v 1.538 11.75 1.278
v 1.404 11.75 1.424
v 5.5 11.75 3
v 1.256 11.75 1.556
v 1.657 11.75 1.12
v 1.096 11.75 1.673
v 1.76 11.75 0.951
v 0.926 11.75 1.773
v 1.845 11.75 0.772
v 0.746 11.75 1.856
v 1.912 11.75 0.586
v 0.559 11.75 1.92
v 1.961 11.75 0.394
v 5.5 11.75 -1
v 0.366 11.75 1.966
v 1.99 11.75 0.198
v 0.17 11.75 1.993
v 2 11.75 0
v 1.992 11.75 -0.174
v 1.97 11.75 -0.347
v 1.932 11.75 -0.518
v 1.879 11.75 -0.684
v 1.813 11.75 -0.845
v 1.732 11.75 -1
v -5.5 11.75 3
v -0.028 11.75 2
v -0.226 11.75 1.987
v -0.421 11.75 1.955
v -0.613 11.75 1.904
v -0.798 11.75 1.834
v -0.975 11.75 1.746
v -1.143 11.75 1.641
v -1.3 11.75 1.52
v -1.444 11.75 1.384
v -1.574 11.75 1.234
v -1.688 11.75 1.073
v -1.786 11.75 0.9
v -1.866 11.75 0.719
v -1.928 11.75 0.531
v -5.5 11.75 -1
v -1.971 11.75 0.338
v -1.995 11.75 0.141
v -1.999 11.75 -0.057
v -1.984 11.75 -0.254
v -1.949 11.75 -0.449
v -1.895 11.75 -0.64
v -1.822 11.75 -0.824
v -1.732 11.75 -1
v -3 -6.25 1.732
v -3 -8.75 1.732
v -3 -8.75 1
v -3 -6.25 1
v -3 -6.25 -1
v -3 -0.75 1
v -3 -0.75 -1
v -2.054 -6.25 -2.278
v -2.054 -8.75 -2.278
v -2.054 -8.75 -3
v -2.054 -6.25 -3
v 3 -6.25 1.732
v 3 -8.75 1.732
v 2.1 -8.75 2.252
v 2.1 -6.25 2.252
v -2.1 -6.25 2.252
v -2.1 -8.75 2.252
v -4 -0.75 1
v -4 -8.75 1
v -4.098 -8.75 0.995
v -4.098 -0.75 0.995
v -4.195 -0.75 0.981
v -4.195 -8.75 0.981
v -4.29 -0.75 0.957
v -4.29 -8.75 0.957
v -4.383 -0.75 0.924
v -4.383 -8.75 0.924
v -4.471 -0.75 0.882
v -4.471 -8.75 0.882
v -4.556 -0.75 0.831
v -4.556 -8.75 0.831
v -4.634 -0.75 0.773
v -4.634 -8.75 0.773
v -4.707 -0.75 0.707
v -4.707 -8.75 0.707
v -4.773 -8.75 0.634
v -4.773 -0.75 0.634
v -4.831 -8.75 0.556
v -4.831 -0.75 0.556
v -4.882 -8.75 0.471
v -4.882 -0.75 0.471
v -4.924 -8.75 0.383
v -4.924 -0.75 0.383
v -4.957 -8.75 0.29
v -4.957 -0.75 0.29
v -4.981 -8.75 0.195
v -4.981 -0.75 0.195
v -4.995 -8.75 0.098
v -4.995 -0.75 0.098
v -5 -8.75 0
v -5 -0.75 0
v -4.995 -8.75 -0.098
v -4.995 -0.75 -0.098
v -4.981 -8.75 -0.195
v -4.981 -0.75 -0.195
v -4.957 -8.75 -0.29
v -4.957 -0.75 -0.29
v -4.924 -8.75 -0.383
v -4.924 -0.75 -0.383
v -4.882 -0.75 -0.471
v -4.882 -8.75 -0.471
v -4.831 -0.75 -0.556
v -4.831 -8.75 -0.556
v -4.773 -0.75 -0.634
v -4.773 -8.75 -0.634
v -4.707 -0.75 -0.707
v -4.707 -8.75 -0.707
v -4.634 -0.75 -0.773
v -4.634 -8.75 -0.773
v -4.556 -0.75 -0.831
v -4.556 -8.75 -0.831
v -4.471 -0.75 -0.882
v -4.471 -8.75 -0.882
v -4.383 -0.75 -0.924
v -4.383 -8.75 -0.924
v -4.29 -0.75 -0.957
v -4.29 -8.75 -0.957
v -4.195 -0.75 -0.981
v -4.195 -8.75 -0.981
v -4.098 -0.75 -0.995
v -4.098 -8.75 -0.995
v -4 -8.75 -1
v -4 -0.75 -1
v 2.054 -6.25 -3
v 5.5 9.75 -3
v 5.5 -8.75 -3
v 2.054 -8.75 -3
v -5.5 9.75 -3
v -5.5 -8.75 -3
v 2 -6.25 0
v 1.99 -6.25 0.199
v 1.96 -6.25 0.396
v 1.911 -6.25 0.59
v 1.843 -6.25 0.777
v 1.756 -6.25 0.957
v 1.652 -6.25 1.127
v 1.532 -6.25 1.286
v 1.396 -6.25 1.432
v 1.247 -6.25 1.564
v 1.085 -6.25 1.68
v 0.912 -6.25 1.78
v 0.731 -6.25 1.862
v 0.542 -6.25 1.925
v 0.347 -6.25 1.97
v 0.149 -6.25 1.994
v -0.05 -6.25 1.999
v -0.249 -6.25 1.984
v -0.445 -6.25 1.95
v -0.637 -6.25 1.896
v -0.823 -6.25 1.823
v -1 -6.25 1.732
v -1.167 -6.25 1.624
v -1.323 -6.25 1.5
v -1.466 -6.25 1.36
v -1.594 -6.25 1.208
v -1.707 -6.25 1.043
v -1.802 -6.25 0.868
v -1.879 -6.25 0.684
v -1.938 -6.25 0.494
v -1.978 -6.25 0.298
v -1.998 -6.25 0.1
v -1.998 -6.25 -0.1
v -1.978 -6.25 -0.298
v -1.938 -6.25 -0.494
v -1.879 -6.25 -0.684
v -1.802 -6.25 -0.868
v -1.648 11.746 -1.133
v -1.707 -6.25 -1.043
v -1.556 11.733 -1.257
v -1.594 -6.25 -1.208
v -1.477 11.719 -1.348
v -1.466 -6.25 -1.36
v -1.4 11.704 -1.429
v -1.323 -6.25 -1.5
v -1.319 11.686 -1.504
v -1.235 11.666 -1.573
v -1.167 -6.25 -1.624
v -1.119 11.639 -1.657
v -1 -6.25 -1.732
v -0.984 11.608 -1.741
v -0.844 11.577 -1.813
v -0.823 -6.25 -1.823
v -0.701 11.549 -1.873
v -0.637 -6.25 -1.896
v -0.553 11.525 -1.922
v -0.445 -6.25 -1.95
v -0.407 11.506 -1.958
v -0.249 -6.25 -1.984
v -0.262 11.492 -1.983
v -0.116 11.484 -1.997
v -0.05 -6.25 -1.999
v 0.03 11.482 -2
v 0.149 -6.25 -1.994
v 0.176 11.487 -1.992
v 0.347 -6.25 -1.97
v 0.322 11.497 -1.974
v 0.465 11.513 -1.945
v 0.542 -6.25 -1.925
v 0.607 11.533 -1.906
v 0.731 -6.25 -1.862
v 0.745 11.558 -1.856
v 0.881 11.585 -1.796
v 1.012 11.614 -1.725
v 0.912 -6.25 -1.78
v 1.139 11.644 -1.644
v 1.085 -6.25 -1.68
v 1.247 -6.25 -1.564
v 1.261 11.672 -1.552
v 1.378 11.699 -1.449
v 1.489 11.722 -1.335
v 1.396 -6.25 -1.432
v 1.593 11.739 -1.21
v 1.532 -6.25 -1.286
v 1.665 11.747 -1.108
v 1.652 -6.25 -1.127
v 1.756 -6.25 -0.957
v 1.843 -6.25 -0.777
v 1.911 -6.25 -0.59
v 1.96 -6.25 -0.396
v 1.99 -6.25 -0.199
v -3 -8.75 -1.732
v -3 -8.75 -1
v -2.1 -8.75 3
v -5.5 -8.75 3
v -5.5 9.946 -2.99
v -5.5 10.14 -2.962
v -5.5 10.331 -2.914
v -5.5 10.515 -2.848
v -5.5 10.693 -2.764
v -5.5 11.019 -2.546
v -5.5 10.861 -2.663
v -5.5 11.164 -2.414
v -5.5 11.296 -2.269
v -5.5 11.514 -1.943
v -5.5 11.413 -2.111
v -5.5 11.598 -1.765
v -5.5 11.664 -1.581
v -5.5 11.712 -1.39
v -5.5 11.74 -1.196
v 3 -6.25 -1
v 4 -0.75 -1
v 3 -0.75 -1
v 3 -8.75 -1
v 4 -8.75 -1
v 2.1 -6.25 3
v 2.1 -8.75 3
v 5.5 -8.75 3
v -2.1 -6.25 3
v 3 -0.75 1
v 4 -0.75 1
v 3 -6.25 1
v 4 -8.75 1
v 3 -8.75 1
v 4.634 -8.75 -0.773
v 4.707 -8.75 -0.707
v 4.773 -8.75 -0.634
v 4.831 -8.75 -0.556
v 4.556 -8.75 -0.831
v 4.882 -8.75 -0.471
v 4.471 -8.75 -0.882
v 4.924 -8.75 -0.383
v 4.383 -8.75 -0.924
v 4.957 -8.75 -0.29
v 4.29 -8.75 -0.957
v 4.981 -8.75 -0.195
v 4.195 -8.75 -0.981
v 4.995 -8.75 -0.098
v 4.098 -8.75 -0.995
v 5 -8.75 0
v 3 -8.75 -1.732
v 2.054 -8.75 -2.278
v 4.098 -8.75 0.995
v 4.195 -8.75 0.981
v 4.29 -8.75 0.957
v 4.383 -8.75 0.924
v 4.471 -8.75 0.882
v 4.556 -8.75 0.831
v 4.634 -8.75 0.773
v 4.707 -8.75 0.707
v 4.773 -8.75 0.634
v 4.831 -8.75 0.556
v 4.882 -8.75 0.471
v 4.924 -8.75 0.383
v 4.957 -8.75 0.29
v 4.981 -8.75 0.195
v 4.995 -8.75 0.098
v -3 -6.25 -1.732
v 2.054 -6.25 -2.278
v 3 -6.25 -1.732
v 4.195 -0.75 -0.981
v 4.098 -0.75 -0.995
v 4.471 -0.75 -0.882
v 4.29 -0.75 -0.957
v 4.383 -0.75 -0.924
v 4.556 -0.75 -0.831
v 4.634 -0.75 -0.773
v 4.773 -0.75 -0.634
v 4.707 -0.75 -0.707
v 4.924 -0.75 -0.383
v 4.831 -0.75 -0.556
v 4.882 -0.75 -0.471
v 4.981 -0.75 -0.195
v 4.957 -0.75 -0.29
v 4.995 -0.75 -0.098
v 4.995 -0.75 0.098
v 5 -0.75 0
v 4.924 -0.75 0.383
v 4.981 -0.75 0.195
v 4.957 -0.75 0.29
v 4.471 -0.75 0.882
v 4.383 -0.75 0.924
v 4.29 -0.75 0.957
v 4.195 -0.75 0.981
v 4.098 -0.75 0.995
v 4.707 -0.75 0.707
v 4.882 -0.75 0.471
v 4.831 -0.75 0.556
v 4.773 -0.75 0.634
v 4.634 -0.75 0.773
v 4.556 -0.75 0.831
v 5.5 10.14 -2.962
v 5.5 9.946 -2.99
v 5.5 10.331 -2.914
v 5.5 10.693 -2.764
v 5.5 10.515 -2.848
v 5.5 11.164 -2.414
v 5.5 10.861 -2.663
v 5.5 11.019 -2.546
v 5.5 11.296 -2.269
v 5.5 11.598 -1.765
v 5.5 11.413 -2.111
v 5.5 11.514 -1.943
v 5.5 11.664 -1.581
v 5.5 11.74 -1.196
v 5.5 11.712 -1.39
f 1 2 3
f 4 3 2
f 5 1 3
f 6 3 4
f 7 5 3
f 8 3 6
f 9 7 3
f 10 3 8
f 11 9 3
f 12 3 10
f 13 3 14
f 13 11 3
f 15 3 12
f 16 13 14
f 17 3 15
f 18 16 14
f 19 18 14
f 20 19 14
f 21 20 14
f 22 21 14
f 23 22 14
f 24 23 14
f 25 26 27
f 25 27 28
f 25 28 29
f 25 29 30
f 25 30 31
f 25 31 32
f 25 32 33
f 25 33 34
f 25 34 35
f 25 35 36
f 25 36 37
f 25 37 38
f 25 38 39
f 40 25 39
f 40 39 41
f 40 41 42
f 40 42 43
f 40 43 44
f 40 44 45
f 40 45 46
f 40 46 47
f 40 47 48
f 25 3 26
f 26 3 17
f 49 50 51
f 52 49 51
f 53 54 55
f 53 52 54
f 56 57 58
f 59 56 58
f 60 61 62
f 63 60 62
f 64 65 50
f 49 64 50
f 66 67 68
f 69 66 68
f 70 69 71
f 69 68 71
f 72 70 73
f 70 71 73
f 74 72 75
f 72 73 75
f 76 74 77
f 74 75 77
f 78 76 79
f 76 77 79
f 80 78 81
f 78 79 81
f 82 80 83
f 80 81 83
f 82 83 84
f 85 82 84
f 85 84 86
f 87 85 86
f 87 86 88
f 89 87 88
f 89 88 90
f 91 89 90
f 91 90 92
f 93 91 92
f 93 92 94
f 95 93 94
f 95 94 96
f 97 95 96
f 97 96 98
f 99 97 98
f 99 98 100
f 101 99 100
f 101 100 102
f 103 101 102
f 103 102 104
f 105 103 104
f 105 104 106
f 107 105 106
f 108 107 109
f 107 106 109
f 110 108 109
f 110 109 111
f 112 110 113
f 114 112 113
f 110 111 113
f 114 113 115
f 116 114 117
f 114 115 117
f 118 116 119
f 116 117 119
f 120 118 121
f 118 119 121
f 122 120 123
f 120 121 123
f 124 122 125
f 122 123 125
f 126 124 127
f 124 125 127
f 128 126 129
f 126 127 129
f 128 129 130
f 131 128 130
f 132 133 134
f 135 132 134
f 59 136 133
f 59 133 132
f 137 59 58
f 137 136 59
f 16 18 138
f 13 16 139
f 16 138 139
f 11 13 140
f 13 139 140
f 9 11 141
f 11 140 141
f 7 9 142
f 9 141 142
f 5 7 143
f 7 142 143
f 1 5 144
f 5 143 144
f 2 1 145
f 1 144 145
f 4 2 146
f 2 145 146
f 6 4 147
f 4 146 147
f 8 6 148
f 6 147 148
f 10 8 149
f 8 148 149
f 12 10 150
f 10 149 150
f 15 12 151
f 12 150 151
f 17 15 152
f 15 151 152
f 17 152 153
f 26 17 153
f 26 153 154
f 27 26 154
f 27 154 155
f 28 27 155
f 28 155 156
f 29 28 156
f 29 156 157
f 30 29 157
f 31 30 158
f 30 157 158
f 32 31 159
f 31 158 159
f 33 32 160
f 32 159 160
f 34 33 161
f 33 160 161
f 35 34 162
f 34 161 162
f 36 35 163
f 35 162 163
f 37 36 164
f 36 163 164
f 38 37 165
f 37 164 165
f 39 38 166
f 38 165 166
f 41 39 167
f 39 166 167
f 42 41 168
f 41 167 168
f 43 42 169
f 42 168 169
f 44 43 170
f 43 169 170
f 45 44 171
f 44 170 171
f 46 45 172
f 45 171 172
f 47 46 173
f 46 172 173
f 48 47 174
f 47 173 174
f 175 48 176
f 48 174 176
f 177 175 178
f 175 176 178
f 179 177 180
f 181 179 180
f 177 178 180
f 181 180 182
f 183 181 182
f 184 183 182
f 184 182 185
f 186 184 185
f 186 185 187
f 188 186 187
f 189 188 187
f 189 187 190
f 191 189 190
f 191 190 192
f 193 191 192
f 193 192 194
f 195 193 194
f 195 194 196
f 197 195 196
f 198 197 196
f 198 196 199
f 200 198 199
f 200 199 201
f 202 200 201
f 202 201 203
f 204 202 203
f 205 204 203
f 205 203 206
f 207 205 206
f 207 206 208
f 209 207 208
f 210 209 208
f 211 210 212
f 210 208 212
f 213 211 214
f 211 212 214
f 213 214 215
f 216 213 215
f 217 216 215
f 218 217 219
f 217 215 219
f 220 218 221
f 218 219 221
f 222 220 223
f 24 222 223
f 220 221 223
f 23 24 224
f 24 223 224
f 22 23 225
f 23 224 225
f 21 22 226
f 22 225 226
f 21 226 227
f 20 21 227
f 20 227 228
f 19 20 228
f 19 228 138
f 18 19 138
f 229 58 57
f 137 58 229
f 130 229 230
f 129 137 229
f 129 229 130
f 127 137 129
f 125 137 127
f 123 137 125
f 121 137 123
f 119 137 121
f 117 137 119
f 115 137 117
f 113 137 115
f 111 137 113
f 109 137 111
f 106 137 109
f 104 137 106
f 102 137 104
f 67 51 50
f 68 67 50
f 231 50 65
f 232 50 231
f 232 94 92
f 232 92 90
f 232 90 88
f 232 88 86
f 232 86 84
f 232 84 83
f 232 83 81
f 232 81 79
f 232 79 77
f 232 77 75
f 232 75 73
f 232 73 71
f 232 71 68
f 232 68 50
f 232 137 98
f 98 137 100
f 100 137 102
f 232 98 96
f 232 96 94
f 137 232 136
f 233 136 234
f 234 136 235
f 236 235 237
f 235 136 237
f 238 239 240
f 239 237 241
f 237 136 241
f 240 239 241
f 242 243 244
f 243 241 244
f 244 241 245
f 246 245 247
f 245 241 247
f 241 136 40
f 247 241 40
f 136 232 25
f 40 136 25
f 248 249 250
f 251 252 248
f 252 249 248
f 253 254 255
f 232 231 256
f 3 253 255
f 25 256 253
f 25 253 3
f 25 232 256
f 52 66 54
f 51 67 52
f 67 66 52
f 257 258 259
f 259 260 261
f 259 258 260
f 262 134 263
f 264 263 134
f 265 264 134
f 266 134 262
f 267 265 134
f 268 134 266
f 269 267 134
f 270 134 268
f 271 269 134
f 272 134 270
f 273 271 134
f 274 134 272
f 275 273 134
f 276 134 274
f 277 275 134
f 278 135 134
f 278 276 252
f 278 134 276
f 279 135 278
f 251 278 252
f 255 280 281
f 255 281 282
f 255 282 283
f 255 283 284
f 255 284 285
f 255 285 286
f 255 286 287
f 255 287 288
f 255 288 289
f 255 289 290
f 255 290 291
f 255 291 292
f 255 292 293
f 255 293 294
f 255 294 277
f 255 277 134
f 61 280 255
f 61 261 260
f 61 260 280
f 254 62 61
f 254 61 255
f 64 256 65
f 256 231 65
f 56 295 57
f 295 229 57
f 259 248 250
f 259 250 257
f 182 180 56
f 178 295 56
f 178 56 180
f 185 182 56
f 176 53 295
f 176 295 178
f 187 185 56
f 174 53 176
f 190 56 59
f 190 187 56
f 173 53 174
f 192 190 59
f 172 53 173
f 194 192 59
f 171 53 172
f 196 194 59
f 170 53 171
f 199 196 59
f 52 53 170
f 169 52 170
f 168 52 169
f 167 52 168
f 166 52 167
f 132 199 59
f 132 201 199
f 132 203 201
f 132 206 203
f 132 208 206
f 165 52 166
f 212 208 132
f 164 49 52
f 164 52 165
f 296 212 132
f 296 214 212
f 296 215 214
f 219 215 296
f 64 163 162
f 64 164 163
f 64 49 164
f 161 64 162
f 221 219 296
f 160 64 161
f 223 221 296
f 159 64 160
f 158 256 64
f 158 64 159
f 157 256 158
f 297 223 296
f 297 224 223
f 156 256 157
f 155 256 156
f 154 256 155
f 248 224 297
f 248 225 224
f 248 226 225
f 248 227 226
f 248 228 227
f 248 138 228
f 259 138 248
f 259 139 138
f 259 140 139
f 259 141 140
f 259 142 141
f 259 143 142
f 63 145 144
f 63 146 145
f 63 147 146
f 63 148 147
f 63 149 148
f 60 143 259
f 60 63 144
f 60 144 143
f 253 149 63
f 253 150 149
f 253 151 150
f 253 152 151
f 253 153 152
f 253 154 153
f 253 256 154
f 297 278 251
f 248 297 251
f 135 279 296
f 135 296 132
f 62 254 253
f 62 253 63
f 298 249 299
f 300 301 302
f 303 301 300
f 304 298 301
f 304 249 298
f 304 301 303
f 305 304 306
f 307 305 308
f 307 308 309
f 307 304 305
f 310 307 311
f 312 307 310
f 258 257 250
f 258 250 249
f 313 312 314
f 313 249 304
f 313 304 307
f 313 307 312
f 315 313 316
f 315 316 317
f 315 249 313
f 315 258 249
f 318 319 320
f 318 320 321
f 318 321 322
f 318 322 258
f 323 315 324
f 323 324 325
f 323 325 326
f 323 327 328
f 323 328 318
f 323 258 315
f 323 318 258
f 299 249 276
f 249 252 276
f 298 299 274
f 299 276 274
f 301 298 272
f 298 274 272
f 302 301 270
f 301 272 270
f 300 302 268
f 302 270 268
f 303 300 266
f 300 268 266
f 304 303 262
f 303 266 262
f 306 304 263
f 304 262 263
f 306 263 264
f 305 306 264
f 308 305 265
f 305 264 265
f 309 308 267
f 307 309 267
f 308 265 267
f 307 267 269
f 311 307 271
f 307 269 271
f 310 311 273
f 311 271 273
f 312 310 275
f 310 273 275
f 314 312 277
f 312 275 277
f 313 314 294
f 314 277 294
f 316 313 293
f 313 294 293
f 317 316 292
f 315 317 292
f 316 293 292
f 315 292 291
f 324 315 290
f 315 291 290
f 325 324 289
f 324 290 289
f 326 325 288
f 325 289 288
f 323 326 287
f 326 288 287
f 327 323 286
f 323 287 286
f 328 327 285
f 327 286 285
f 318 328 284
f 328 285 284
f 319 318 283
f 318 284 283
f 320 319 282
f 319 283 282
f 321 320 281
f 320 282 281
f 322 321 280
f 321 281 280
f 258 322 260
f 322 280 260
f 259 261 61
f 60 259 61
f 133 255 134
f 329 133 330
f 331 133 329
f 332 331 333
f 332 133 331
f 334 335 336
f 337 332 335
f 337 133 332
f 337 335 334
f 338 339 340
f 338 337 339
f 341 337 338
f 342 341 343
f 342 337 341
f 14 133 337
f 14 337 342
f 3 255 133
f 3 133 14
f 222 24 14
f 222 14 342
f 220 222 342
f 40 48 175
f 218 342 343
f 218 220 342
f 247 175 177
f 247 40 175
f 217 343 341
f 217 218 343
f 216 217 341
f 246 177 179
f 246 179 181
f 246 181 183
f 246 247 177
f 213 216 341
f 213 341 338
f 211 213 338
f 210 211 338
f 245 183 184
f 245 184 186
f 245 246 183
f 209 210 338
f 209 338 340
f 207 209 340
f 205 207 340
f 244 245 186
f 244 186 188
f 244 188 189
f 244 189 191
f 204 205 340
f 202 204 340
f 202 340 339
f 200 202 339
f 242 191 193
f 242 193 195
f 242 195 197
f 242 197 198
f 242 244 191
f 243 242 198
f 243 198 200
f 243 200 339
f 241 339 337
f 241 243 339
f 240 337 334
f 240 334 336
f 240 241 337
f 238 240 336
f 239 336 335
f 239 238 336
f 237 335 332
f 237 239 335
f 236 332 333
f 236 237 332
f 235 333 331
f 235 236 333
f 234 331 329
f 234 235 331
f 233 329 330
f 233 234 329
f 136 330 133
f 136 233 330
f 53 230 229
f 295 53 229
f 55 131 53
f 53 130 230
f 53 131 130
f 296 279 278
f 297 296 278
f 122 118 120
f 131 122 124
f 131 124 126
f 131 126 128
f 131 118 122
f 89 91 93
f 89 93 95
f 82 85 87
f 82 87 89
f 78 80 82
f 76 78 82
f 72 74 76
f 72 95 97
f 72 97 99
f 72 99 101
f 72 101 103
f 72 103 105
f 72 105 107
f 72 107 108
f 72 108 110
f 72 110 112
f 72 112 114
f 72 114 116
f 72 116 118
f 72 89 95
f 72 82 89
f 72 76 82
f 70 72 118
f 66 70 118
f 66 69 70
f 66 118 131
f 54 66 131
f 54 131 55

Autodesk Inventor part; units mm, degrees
ref_plane "plane_support" through (-5.5, -7.5, -3) normal (0, -1, 0) x (1, 0, 0)
ref_plane "plane_support_frontb" through (-2.75, 0, 0) normal (1, 0, 0) x (0, 0, -1)
ref_plane "plane_support_frontt" through (2.75, 0, 0) normal (-1, 0, 0) x (0, 0, 1)
sketch "Sketch14" plane through (0, 0, 0) normal (1, 0, 0) x (0, 1, 0)
  line L0 (-12.85, 0) -> (15.85, 0) projected
  line L1 (0, -4.2) -> (0, 4.2) projected
  line L2 (8.75, -3) -> (-8.75, -3)
  line L3 (-8.75, -3) -> (-8.75, 3)
  line L4 (-8.75, 3) -> (8.75, 3)
  line L5 (8.75, 3) -> (8.75, -3) construction
  line L6 (8.75, -3) -> (-8.75, 3) construction
  line L7 (-8.75, -3) -> (8.75, 3) construction
  line L8 (5.25, 3) -> (5.25, -3) construction
  line L9 (-6.25, 3) -> (-6.25, -3) construction
  arc A0 (8.75, -3) -> (8.75, 3) centre (8.75, 0) ccw
  circle A1 centre (8.75, 0) radius 1.25 construction
  circle A2 centre (8.75, 0) radius 3 construction
  line L10 (5.75, 3) -> (5.75, -3) construction
  line L11 (11.75, 3) -> (11.75, -3)
  line L12 (11.75, -3) -> (8.75, -3)
  line L13 (8.75, 3) -> (11.75, 3)
  point P0 (0, 0)
  point P1 (0, 0)
  dimension "d72" = 6
  dimension "d74" = 2.5
  dimension "d75" = 2.5
  dimension "d76" = 0.5
  dimension "d105" = 18
extrude "ext_main" add sketch "Sketch14" along normal mid plane 11
sketch "sk_channel_nut" plane through (-5.5, -8.75, -3) normal (0, -1, 0) x (1, 0, 0)
  line L0 (-2.2, 3) -> (13.2, 3) projected
  line L1 (5.5, -1.8497) -> (5.5, 7.8497) projected
  circle A0 centre (5.5, 3) radius 2
  line L2 (5.5, 6.4641) -> (2.5, 4.7321)
  line L3 (2.5, 4.7321) -> (2.5, 1.2679)
  line L4 (2.5, 1.2679) -> (5.5, -0.4641)
  line L5 (5.5, -0.4641) -> (8.5, 1.2679)
  line L6 (8.5, 1.2679) -> (8.5, 4.7321)
  line L7 (8.5, 4.7321) -> (5.5, 6.4641)
  circle A1 centre (1.5, 3) radius 1
  circle A2 centre (9.5, 3) radius 1
  line L8 (1.5, 4) -> (2.5, 4)
  line L9 (1.5, 2) -> (2.5, 2)
  line L10 (9.5, 4) -> (8.5, 4)
  line L11 (9.5, 2) -> (8.5, 2)
  line L12 (0, 0) -> (11, 0) projected
  line L13 (0, 6) -> (11, 6) projected
  line L14 (0, 0) -> (0, 6) projected
  line L15 (3.4, 6) -> (3.4, 5.2517)
  line L16 (3.4456, 0.722) -> (3.4456, 0)
  line L17 (7.5544, 0.722) -> (7.5544, 0)
  line L18 (7.6, 6) -> (7.6, 5.2517)
  point P0 (2.5, 3)
  dimension "d85" = 4
  dimension "d86" = 120
  dimension "d87" = 6
  dimension "d88" = 2
  dimension "d95" = 4.2
extrude "ext_cut_channel" cut sketch "sk_channel_nut" against normal through all contours A0 L1 L0 | L0 L1 A0 | L1 A0 L0 | L0 A0 L1
extrude "ext_cut_bottomscrews" cut sketch "sk_channel_nut" against normal blind 8 contours A1 L0 | L0 A1 | A1 L8 L3 | L3 L9 A1 | A2 L0 | A2 L11 L6 | L6 L10 A2 | L0 A2
extrude "ext_cut_bottom_nut" cut sketch "sk_channel_nut" against normal blind 2.5 contours L3 L2 L13 L1 A0 L0 | L0 A0 L1 L12 L4 L3 | L16 L4 L12 | L13 L2 L15 | A0 L1 L0 | L0 L1 A0 | L12 L1 L4 | L2 L1 L13 | L1 A0 L0 | L0 A0 L1 | L1 L13 L7 L6 L0 A0 | A0 L0 L6 L5 L12 L1 | L1 L12 L5 | L7 L13 L1 | L5 L17 L12 | L13 L18 L7
fillet "Fillet1" radius 2 1 edges at (0, 11.75, -3)
sketch "Sketch19" plane through (-5.5, -7.5, -3) normal (0, -1, 0) x (1, 0, 0)
  line L0 (3.4, 6) -> (7.6, 6) projected
  line L1 (3.4, 5.2517) -> (3.4, 6) projected
  line L2 (2.5, 4.7321) -> (3.4, 5.2517) projected
  line L3 (2.5, 4) -> (2.5, 4.7321) projected
  line L4 (2.5, 2) -> (2.5, 4) projected
  line L5 (2.5, 1.2679) -> (2.5, 2) projected
  line L6 (3.4456, 0.722) -> (2.5, 1.2679) projected
  line L7 (3.4456, 0) -> (3.4456, 0.722) projected
  line L8 (7.5544, 0) -> (3.4456, 0) projected
  line L9 (7.5544, 0.722) -> (7.5544, 0) projected
  line L10 (8.5, 1.2679) -> (7.5544, 0.722) projected
  line L11 (8.5, 2) -> (8.5, 1.2679) projected
  line L12 (8.5, 4) -> (8.5, 2) projected
  line L13 (8.5, 4.7321) -> (8.5, 4) projected
  line L14 (7.6, 5.2517) -> (8.5, 4.7321) projected
  line L15 (7.6, 6) -> (7.6, 5.2517) projected
  circle A0 centre (5.5, 3) radius 2 projected
  line L16 (3.65, 5.75) -> (7.35, 5.75) construction
  line L17 (7.35, 5.75) -> (7.35, 5.1073)
  line L18 (7.35, 5.1073) -> (8.25, 4.5877)
  line L19 (8.25, 4.5877) -> (8.25, 4)
  line L20 (8.25, 4) -> (8.25, 2)
  line L21 (8.25, 2) -> (8.25, 1.4123)
  line L22 (8.25, 1.4123) -> (7.3044, 0.8664)
  line L23 (7.3044, 0.8664) -> (7.3044, 0.25)
  line L24 (7.3044, 0.25) -> (3.6956, 0.25) construction
  line L25 (3.6956, 0.25) -> (3.6956, 0.8664)
  line L26 (3.6956, 0.8664) -> (2.75, 1.4123)
  line L27 (2.75, 1.4123) -> (2.75, 2)
  line L28 (2.75, 2) -> (2.75, 4)
  line L29 (2.75, 4) -> (2.75, 4.5877)
  line L30 (2.75, 4.5877) -> (3.65, 5.1073)
  line L31 (3.65, 5.1073) -> (3.65, 5.75)
  line L32 (3.65, 5.75) -> (7.35, 5.75)
  line L33 (7.35, 5.75) -> (7.35, 6)
  line L34 (7.35, 6) -> (3.65, 6)
  line L35 (3.65, 6) -> (3.65, 5.75)
  line L36 (3.6956, 0.25) -> (7.3044, 0.25)
  line L37 (7.3044, 0.25) -> (7.3044, 0)
  line L38 (7.3044, 0) -> (3.6956, 0)
  line L39 (3.6956, 0) -> (3.6956, 0.25)
  point P0 (5.5, 3)
  dimension "d97" = 0.25
sketch "Sketch20" plane through (-2.75, 0, 0) normal (1, 0, 0) x (0, 0, -1)
  circle A0 centre (0, 9) radius 1.25 projected
  arc A1 (3, 9) -> (-3, 9) centre (0, 9) ccw projected
  line L0 (-3, 6) -> (-3, 9) projected
  line L1 (3, 6) -> (-3, 6) projected
  line L2 (3, 9) -> (3, 6) projected
  line L3 (-3, 7) -> (3, 7)
  point P0 (0, 0)
  dimension "d102" = 1
equation "\"d74\" = nut_m3_thickness_max"
equation "\"d75\" = screw_m2_bore_loose"
equation "\"d87\" = nut_m3_width_acrossflats"
equation "\"d88\" = screw_m2_bore_selfthreading"
equation "\"d95\" = 0.7 * nut_m3_width_acrossflats"
equation "\"d89\" = linact_rod_effective_length + nut_m3_thickness_max"
equation "\"d93\" = nut_m3_thickness_max"
equation "\"d97\" = print_support_z_clearance"
equation "\"d102\" = print_support_xy_clearance"
equation "\"d96\" = print_support_xy_clearance"
equation "\"d100\" = print_support_z_clearance"
equation "\"d101\" = print_support_z_clearance"
equation "\"nut_m3_thickness_max\" = 2.5"
equation "\"screw_m2_bore_loose\" = 2.5"
equation "\"nut_m3_width_acrossflats\" = 6"
equation "\"screw_m2_bore_selfthreading\" = 2"
equation "\"linact_rod_effective_length\" = 12"
equation "\"print_support_z_clearance\" = 0.25"
equation "\"print_support_xy_clearance\" = 1"
properties part number "empty"
